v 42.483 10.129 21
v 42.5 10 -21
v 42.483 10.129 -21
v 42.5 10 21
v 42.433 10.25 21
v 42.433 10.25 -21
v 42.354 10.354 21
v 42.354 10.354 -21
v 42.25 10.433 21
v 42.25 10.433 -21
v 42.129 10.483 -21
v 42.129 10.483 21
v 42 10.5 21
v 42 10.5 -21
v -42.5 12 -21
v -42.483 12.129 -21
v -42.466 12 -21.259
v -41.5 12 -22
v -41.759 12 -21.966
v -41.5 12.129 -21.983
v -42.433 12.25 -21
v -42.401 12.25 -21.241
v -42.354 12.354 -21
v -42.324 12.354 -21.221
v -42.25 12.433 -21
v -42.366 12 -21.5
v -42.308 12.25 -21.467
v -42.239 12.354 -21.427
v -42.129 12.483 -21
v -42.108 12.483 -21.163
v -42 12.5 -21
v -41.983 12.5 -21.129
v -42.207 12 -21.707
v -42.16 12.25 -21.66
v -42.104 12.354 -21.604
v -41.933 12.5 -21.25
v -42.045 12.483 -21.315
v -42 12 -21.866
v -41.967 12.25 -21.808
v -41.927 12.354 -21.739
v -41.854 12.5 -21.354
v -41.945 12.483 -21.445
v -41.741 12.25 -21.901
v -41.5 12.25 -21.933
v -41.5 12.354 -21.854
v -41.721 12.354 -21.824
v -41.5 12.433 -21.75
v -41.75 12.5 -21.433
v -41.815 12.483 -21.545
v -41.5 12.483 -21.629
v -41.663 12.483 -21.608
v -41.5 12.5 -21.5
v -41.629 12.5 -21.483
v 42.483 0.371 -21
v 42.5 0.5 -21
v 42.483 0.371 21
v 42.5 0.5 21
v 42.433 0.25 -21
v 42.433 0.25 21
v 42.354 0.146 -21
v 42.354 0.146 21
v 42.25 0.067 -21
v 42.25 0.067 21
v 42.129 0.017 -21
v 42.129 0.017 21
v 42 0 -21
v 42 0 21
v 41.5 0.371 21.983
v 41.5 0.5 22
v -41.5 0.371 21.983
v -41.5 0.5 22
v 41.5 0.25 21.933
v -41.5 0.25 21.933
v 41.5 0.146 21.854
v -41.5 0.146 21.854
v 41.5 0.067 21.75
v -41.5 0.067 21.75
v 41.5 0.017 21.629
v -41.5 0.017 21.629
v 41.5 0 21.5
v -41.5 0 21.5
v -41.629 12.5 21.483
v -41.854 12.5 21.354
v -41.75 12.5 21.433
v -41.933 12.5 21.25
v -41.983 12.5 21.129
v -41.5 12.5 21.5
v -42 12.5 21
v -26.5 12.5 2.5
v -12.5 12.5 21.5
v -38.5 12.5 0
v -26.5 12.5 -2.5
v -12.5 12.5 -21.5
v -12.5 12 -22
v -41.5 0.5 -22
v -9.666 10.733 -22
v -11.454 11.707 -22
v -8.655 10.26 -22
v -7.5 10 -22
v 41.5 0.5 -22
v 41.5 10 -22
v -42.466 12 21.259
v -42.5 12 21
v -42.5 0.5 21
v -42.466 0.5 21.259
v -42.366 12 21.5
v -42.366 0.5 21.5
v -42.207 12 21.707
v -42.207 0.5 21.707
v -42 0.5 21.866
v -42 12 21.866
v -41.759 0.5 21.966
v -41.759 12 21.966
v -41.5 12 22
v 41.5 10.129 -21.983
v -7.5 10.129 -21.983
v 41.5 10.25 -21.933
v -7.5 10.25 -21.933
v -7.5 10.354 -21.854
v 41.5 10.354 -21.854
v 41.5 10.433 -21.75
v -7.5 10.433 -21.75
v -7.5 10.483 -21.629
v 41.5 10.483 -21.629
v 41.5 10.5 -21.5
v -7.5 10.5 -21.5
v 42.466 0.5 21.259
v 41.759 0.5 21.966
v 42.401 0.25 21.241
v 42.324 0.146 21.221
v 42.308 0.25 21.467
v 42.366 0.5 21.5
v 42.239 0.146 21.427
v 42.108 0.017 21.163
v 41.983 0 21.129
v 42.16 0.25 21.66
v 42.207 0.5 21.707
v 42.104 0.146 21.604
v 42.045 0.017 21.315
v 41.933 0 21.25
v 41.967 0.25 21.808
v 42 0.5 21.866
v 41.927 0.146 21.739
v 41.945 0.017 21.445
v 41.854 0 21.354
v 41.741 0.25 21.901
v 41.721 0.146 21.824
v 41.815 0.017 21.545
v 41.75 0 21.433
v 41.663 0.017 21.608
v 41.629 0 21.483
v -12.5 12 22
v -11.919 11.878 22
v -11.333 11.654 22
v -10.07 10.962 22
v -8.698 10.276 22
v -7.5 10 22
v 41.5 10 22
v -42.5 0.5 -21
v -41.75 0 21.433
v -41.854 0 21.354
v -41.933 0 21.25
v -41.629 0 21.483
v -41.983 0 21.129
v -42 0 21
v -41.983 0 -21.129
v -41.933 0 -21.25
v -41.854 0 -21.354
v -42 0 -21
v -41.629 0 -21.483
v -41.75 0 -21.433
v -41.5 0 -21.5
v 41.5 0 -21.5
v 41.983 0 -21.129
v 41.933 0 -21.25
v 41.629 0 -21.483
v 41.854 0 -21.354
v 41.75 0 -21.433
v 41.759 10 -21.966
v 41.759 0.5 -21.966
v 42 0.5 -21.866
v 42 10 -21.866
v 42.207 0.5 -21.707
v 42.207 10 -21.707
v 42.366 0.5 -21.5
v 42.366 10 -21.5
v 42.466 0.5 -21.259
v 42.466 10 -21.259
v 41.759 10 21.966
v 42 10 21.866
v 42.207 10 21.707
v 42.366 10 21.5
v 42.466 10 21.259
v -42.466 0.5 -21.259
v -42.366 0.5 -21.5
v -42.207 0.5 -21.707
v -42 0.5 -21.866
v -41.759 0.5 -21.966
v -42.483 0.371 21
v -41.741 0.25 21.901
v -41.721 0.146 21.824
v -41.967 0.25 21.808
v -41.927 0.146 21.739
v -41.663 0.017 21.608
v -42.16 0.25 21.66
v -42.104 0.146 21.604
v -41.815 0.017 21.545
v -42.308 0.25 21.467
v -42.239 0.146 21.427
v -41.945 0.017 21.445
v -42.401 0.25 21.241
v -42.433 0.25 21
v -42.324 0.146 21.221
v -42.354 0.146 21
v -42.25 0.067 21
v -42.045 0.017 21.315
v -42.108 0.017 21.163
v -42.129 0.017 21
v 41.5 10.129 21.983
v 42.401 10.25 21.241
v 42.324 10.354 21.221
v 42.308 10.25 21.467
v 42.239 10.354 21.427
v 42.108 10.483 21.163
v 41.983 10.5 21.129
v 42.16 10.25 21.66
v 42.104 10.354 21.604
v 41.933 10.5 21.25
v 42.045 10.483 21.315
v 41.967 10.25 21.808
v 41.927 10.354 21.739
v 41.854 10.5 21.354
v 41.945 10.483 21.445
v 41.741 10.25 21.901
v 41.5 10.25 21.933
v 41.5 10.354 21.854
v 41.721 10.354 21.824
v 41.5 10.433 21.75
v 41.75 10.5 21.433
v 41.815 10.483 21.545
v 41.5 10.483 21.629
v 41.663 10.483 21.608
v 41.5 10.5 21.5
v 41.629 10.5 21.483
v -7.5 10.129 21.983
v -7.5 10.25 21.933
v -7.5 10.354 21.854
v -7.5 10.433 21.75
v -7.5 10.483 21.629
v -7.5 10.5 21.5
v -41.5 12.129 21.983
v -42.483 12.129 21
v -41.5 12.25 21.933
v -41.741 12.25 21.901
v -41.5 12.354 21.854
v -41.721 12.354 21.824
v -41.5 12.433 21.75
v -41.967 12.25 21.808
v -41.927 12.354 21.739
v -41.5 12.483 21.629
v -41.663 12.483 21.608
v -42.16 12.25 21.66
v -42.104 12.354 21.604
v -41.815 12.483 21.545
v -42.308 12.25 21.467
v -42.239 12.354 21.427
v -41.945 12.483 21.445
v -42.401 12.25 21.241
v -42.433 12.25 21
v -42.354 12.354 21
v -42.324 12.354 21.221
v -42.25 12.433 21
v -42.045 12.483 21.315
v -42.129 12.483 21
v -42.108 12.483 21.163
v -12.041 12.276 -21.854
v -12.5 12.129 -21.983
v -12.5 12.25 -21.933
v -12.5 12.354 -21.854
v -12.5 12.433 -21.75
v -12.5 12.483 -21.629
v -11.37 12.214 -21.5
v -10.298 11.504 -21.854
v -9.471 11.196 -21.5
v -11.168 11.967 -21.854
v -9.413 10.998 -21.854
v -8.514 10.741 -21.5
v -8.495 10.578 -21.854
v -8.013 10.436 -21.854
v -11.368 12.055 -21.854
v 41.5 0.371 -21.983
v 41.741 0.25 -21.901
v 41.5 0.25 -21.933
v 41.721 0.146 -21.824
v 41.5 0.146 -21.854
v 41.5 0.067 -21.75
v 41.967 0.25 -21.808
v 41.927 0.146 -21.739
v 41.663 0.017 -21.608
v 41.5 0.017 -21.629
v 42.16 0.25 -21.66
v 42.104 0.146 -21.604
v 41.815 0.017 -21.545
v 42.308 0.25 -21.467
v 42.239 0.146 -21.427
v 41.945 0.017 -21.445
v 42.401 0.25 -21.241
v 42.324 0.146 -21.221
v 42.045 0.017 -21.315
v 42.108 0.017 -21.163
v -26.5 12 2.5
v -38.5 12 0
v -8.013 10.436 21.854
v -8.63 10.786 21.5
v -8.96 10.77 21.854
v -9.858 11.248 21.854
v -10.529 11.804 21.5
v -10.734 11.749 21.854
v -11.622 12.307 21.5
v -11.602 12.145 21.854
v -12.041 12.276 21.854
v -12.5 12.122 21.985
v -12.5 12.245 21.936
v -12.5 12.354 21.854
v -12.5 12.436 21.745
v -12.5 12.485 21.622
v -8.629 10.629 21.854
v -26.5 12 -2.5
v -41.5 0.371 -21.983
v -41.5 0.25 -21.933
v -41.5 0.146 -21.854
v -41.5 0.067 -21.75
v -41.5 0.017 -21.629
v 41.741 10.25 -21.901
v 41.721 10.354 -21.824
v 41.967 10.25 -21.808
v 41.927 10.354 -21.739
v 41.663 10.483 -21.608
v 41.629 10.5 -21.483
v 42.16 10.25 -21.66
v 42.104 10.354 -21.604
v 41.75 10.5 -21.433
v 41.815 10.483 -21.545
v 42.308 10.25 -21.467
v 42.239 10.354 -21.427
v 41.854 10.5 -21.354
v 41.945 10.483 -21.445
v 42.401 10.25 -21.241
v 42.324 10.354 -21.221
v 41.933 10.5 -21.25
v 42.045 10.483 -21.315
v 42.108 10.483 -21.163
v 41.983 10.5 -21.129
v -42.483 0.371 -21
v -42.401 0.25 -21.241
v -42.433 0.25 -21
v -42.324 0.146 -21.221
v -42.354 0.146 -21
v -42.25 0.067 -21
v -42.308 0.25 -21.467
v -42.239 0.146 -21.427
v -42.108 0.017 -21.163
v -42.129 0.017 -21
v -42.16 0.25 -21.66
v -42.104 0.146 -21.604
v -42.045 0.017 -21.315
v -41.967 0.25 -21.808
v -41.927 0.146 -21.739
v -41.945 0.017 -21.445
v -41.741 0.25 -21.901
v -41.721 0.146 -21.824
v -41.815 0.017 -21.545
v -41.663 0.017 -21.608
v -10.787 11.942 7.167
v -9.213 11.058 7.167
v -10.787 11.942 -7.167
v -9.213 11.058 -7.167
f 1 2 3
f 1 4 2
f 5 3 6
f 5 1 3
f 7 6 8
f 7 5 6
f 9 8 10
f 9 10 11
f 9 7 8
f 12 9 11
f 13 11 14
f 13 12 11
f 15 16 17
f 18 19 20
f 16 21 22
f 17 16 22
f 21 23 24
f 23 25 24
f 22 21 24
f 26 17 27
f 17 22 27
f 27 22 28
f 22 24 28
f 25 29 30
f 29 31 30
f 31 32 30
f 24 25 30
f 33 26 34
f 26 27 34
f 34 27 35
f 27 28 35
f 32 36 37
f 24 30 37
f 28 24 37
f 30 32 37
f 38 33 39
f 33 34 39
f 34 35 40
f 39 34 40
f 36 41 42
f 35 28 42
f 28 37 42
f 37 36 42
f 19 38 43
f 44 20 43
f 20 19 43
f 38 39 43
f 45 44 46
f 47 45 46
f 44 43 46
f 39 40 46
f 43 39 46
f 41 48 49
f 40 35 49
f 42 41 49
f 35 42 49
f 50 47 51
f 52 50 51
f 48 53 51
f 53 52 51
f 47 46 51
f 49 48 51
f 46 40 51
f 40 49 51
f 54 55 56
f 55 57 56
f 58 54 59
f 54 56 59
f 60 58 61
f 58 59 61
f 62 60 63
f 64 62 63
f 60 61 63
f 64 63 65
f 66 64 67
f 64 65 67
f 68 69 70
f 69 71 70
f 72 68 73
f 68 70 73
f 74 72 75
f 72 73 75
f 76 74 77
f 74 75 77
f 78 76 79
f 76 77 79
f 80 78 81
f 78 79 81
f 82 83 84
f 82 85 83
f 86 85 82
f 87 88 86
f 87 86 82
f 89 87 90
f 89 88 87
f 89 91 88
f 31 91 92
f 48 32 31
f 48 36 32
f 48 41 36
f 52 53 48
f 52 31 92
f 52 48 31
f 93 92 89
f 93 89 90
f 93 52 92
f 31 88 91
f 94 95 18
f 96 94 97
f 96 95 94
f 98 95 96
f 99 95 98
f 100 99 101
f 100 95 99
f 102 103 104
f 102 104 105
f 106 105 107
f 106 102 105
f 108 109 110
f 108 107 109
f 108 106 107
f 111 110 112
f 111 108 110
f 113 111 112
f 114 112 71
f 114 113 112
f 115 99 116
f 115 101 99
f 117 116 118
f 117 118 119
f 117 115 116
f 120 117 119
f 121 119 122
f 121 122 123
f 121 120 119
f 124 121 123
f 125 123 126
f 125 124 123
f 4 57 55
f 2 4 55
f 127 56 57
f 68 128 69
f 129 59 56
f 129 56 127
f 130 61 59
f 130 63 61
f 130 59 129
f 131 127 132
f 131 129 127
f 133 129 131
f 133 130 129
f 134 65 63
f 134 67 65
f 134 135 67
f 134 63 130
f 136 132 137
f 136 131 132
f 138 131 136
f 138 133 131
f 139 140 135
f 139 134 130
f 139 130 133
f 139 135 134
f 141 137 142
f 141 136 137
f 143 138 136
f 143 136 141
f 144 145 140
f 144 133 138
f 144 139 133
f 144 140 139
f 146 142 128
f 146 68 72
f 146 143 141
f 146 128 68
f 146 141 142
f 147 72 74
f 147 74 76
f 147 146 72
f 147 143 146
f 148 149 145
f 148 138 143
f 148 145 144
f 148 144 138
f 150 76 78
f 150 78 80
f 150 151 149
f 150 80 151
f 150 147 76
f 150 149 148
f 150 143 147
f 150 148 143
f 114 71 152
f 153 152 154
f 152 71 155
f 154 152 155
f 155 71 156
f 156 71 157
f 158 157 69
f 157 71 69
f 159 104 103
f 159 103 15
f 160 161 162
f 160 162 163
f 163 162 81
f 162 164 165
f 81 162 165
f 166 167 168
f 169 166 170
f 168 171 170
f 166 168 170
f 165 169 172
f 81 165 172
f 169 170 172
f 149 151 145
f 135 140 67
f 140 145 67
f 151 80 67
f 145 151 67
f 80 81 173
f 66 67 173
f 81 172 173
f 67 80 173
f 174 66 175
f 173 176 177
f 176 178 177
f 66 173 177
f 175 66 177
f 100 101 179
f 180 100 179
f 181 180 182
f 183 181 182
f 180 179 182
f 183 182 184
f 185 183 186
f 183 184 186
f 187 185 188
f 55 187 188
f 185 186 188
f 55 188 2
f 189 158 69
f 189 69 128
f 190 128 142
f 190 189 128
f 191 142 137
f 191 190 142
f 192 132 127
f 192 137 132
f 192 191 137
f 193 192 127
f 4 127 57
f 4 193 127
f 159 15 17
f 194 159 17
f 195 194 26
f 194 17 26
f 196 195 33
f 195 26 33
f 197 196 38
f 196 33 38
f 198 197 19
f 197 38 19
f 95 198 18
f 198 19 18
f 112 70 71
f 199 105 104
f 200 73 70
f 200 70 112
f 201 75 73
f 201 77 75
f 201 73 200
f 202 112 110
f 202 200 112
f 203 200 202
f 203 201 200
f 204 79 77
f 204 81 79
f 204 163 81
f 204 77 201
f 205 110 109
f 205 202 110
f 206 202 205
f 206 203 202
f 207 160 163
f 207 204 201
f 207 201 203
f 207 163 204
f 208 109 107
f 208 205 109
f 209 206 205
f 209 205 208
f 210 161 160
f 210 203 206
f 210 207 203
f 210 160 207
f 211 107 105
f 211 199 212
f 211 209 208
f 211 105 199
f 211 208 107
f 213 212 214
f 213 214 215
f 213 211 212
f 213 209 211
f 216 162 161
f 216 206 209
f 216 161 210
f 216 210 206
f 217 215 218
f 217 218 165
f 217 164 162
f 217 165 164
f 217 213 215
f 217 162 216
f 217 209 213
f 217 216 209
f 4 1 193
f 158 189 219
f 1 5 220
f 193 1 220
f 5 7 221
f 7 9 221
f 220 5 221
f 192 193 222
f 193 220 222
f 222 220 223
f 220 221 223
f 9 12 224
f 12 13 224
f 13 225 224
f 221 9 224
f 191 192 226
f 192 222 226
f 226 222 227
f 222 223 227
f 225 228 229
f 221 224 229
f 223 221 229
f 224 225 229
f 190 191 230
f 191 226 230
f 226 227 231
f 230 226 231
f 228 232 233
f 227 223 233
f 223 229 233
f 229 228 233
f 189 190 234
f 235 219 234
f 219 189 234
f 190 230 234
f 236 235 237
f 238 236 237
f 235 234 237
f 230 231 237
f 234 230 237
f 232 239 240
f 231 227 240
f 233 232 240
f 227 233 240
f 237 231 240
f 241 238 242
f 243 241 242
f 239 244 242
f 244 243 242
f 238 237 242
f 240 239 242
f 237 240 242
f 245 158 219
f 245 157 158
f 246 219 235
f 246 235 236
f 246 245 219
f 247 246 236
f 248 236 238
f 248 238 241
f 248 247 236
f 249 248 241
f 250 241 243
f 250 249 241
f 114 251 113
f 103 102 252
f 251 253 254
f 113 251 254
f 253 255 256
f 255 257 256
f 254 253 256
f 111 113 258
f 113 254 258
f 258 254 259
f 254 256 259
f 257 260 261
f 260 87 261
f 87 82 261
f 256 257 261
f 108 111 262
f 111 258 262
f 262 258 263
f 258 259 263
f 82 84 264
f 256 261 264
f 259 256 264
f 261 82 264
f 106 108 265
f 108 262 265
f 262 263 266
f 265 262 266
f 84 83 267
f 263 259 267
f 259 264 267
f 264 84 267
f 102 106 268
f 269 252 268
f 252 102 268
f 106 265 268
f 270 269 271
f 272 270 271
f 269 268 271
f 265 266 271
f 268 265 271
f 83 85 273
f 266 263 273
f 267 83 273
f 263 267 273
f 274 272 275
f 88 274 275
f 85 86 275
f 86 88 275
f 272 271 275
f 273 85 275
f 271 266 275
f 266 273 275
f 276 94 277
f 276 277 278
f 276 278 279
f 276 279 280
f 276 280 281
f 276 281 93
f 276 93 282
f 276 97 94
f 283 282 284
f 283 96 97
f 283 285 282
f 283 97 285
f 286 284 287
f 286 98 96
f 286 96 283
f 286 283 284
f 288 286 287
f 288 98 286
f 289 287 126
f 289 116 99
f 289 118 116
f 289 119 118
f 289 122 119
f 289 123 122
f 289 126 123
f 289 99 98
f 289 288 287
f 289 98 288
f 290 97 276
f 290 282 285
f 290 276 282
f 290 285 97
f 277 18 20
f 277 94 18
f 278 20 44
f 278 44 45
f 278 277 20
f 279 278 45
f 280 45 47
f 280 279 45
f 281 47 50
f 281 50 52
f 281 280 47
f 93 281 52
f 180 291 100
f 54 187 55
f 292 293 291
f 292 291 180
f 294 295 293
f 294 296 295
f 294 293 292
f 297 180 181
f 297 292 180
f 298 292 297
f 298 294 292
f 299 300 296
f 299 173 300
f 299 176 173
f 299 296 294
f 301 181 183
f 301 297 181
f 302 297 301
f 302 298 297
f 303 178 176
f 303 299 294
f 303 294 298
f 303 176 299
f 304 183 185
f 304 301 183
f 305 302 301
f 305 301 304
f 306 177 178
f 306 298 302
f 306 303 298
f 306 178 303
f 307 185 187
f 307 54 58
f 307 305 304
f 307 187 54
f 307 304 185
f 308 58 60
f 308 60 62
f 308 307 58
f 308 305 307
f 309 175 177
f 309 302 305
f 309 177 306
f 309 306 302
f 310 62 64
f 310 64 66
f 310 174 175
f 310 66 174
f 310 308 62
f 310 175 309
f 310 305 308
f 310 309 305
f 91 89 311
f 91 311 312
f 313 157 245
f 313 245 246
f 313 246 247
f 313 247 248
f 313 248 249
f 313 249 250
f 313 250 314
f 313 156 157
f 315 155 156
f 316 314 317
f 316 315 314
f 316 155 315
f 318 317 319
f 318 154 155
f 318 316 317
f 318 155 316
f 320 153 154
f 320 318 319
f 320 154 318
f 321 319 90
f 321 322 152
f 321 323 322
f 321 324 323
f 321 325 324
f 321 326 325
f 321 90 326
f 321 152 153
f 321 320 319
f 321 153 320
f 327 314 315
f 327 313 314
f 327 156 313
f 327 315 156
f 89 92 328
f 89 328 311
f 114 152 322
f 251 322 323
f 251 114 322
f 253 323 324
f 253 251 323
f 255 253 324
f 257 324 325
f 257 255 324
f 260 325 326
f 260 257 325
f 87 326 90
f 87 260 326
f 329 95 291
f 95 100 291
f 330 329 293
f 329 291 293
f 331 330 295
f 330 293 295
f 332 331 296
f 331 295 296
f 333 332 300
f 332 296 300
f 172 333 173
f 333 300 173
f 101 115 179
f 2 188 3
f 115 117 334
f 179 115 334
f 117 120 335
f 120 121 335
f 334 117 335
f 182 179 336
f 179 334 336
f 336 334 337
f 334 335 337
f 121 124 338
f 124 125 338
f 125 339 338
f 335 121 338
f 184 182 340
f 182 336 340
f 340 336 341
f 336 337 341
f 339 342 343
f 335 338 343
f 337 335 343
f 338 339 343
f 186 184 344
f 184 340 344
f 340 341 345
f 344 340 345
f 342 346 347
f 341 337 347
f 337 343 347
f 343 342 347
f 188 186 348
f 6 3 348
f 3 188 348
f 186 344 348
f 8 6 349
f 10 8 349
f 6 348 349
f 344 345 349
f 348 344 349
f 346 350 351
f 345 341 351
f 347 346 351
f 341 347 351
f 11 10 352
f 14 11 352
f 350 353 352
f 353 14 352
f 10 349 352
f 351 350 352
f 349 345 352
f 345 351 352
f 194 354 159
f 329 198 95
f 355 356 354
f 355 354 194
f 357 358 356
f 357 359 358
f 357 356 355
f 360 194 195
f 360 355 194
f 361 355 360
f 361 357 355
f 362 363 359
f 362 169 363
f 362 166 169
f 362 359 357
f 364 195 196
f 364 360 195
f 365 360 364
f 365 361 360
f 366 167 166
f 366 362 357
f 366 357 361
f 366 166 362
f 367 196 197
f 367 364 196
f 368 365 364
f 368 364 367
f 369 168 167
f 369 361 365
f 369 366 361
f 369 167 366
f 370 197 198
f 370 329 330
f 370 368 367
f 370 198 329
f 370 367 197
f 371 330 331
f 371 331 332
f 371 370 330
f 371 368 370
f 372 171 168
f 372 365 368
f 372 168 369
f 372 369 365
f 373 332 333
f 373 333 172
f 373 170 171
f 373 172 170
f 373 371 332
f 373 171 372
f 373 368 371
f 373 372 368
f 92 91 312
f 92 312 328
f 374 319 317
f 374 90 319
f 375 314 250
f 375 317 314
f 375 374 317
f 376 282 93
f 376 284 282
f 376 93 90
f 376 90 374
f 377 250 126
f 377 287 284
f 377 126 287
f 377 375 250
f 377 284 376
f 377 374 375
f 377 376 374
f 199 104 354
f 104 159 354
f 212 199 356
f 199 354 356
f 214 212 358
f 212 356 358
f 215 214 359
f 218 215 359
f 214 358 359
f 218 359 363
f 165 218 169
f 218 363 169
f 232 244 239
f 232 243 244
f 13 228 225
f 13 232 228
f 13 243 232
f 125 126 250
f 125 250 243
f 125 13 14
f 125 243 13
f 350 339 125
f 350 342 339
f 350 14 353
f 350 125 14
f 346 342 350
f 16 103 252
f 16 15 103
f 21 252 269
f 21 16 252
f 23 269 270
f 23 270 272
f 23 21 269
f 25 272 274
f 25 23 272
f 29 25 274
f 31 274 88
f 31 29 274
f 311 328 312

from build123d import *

# Parameters (mm, degrees)
SKETCH1_W               = 85
SKETCH1_H               = 44
BOSS_EXTRUDE1_DEPTH     = 15
CUT_EXTRUDE1_DEPTH      = 51.152268144
CUT_EXTRUDE1_DEPTH_BACK = 51.152268144
FILLET1_R               = 1
FILLET2_R               = 0.5
FILLET3_R               = 0.5
CUT_EXTRUDE3_DEPTH      = 0.5


with BuildPart() as part:
    # Sketch1 → Boss-Extrude1 (new body)
    with BuildSketch(Plane(origin=(0, 0, 0), x_dir=(1, 0, 0), z_dir=(0, 1, 0))):
        Rectangle(SKETCH1_W, SKETCH1_H)
    extrude(amount=BOSS_EXTRUDE1_DEPTH)

    # Sketch2 → Cut-Extrude1 (cut, two sides: drawn at the far end of the back side and taken through both)
    with BuildSketch(Plane.XY.offset(-CUT_EXTRUDE1_DEPTH_BACK)):
        with BuildLine():
            Line((-42.5, 12.5), (-12.5, 12.5))
            add(Edge.make_bspline(
                [(-12.5, 12.5), (-10.623415355, 12.323006837), (-9.376584645, 10.676993163), (-7.5, 10.5)],
                knots=[0, 0, 0, 0, 1, 1, 1, 1], degree=3))
            Line((-7.5, 10.5), (42.5, 10.5))
            Line((42.5, 10.5), (42.5, 22.5))
            Line((42.5, 22.5), (-42.5, 22.5))
            Line((-42.5, 22.5), (-42.5, 12.5))
        make_face()
    extrude(amount=CUT_EXTRUDE1_DEPTH + CUT_EXTRUDE1_DEPTH_BACK, mode=Mode.SUBTRACT)

    # Fillet1
    fillet1_edges = [part.edges().sort_by_distance(p)[0] for p in [
        (42.5, 5.25, -22),
        (42.5, 5.25, 22),
        (-42.5, 6.25, 22),
        (-42.5, 6.25, -22),
    ]]
    fillet(fillet1_edges, radius=FILLET1_R)

    # Fillet2
    fillet2_edges = [part.edges().sort_by_distance(p)[0] for p in [
        (17, 10.5, -22),
        (-9.999999993, 11.50000001, -22),
        (-9.999999993, 11.50000001, 22),
        (17, 10.5, 22),
        (-42.5, 12.5, 0),
        (-27, 12.5, -22),
        (-27, 12.5, 22),
        (-42.207106781, 12.5, 21.707106781),
        (-42.207106781, 12.5, -21.707106781),
        (42.5, 10.5, 0),
        (42.207106781, 10.5, 21.707106781),
        (42.207106781, 10.5, -21.707106781),
    ]]
    fillet(fillet2_edges, radius=FILLET2_R)

    # Fillet3
    fillet3_edges = [part.edges().sort_by_distance(p)[0] for p in [
        (-42.5, 0, 0),
        (0, 0, -22),
        (42.5, 0, 0),
        (0, 0, 22),
        (-42.207106781, 0, 21.707106781),
        (42.207106781, 0, 21.707106781),
        (42.207106781, 0, -21.707106781),
        (-42.207106781, 0, -21.707106781),
    ]]
    fillet(fillet3_edges, radius=FILLET3_R)

    # Sketch4 → Cut-Extrude3 (cut)
    with BuildSketch(Plane(origin=(0, 12.5, 0), x_dir=(1, 0, 0), z_dir=(0, 1, 0))):
        Polygon((-38.5, 0), (-26.5, 2.5), (-26.5, -2.5), align=None)
    extrude(amount=-CUT_EXTRUDE3_DEPTH, mode=Mode.SUBTRACT)


solid = part.part
